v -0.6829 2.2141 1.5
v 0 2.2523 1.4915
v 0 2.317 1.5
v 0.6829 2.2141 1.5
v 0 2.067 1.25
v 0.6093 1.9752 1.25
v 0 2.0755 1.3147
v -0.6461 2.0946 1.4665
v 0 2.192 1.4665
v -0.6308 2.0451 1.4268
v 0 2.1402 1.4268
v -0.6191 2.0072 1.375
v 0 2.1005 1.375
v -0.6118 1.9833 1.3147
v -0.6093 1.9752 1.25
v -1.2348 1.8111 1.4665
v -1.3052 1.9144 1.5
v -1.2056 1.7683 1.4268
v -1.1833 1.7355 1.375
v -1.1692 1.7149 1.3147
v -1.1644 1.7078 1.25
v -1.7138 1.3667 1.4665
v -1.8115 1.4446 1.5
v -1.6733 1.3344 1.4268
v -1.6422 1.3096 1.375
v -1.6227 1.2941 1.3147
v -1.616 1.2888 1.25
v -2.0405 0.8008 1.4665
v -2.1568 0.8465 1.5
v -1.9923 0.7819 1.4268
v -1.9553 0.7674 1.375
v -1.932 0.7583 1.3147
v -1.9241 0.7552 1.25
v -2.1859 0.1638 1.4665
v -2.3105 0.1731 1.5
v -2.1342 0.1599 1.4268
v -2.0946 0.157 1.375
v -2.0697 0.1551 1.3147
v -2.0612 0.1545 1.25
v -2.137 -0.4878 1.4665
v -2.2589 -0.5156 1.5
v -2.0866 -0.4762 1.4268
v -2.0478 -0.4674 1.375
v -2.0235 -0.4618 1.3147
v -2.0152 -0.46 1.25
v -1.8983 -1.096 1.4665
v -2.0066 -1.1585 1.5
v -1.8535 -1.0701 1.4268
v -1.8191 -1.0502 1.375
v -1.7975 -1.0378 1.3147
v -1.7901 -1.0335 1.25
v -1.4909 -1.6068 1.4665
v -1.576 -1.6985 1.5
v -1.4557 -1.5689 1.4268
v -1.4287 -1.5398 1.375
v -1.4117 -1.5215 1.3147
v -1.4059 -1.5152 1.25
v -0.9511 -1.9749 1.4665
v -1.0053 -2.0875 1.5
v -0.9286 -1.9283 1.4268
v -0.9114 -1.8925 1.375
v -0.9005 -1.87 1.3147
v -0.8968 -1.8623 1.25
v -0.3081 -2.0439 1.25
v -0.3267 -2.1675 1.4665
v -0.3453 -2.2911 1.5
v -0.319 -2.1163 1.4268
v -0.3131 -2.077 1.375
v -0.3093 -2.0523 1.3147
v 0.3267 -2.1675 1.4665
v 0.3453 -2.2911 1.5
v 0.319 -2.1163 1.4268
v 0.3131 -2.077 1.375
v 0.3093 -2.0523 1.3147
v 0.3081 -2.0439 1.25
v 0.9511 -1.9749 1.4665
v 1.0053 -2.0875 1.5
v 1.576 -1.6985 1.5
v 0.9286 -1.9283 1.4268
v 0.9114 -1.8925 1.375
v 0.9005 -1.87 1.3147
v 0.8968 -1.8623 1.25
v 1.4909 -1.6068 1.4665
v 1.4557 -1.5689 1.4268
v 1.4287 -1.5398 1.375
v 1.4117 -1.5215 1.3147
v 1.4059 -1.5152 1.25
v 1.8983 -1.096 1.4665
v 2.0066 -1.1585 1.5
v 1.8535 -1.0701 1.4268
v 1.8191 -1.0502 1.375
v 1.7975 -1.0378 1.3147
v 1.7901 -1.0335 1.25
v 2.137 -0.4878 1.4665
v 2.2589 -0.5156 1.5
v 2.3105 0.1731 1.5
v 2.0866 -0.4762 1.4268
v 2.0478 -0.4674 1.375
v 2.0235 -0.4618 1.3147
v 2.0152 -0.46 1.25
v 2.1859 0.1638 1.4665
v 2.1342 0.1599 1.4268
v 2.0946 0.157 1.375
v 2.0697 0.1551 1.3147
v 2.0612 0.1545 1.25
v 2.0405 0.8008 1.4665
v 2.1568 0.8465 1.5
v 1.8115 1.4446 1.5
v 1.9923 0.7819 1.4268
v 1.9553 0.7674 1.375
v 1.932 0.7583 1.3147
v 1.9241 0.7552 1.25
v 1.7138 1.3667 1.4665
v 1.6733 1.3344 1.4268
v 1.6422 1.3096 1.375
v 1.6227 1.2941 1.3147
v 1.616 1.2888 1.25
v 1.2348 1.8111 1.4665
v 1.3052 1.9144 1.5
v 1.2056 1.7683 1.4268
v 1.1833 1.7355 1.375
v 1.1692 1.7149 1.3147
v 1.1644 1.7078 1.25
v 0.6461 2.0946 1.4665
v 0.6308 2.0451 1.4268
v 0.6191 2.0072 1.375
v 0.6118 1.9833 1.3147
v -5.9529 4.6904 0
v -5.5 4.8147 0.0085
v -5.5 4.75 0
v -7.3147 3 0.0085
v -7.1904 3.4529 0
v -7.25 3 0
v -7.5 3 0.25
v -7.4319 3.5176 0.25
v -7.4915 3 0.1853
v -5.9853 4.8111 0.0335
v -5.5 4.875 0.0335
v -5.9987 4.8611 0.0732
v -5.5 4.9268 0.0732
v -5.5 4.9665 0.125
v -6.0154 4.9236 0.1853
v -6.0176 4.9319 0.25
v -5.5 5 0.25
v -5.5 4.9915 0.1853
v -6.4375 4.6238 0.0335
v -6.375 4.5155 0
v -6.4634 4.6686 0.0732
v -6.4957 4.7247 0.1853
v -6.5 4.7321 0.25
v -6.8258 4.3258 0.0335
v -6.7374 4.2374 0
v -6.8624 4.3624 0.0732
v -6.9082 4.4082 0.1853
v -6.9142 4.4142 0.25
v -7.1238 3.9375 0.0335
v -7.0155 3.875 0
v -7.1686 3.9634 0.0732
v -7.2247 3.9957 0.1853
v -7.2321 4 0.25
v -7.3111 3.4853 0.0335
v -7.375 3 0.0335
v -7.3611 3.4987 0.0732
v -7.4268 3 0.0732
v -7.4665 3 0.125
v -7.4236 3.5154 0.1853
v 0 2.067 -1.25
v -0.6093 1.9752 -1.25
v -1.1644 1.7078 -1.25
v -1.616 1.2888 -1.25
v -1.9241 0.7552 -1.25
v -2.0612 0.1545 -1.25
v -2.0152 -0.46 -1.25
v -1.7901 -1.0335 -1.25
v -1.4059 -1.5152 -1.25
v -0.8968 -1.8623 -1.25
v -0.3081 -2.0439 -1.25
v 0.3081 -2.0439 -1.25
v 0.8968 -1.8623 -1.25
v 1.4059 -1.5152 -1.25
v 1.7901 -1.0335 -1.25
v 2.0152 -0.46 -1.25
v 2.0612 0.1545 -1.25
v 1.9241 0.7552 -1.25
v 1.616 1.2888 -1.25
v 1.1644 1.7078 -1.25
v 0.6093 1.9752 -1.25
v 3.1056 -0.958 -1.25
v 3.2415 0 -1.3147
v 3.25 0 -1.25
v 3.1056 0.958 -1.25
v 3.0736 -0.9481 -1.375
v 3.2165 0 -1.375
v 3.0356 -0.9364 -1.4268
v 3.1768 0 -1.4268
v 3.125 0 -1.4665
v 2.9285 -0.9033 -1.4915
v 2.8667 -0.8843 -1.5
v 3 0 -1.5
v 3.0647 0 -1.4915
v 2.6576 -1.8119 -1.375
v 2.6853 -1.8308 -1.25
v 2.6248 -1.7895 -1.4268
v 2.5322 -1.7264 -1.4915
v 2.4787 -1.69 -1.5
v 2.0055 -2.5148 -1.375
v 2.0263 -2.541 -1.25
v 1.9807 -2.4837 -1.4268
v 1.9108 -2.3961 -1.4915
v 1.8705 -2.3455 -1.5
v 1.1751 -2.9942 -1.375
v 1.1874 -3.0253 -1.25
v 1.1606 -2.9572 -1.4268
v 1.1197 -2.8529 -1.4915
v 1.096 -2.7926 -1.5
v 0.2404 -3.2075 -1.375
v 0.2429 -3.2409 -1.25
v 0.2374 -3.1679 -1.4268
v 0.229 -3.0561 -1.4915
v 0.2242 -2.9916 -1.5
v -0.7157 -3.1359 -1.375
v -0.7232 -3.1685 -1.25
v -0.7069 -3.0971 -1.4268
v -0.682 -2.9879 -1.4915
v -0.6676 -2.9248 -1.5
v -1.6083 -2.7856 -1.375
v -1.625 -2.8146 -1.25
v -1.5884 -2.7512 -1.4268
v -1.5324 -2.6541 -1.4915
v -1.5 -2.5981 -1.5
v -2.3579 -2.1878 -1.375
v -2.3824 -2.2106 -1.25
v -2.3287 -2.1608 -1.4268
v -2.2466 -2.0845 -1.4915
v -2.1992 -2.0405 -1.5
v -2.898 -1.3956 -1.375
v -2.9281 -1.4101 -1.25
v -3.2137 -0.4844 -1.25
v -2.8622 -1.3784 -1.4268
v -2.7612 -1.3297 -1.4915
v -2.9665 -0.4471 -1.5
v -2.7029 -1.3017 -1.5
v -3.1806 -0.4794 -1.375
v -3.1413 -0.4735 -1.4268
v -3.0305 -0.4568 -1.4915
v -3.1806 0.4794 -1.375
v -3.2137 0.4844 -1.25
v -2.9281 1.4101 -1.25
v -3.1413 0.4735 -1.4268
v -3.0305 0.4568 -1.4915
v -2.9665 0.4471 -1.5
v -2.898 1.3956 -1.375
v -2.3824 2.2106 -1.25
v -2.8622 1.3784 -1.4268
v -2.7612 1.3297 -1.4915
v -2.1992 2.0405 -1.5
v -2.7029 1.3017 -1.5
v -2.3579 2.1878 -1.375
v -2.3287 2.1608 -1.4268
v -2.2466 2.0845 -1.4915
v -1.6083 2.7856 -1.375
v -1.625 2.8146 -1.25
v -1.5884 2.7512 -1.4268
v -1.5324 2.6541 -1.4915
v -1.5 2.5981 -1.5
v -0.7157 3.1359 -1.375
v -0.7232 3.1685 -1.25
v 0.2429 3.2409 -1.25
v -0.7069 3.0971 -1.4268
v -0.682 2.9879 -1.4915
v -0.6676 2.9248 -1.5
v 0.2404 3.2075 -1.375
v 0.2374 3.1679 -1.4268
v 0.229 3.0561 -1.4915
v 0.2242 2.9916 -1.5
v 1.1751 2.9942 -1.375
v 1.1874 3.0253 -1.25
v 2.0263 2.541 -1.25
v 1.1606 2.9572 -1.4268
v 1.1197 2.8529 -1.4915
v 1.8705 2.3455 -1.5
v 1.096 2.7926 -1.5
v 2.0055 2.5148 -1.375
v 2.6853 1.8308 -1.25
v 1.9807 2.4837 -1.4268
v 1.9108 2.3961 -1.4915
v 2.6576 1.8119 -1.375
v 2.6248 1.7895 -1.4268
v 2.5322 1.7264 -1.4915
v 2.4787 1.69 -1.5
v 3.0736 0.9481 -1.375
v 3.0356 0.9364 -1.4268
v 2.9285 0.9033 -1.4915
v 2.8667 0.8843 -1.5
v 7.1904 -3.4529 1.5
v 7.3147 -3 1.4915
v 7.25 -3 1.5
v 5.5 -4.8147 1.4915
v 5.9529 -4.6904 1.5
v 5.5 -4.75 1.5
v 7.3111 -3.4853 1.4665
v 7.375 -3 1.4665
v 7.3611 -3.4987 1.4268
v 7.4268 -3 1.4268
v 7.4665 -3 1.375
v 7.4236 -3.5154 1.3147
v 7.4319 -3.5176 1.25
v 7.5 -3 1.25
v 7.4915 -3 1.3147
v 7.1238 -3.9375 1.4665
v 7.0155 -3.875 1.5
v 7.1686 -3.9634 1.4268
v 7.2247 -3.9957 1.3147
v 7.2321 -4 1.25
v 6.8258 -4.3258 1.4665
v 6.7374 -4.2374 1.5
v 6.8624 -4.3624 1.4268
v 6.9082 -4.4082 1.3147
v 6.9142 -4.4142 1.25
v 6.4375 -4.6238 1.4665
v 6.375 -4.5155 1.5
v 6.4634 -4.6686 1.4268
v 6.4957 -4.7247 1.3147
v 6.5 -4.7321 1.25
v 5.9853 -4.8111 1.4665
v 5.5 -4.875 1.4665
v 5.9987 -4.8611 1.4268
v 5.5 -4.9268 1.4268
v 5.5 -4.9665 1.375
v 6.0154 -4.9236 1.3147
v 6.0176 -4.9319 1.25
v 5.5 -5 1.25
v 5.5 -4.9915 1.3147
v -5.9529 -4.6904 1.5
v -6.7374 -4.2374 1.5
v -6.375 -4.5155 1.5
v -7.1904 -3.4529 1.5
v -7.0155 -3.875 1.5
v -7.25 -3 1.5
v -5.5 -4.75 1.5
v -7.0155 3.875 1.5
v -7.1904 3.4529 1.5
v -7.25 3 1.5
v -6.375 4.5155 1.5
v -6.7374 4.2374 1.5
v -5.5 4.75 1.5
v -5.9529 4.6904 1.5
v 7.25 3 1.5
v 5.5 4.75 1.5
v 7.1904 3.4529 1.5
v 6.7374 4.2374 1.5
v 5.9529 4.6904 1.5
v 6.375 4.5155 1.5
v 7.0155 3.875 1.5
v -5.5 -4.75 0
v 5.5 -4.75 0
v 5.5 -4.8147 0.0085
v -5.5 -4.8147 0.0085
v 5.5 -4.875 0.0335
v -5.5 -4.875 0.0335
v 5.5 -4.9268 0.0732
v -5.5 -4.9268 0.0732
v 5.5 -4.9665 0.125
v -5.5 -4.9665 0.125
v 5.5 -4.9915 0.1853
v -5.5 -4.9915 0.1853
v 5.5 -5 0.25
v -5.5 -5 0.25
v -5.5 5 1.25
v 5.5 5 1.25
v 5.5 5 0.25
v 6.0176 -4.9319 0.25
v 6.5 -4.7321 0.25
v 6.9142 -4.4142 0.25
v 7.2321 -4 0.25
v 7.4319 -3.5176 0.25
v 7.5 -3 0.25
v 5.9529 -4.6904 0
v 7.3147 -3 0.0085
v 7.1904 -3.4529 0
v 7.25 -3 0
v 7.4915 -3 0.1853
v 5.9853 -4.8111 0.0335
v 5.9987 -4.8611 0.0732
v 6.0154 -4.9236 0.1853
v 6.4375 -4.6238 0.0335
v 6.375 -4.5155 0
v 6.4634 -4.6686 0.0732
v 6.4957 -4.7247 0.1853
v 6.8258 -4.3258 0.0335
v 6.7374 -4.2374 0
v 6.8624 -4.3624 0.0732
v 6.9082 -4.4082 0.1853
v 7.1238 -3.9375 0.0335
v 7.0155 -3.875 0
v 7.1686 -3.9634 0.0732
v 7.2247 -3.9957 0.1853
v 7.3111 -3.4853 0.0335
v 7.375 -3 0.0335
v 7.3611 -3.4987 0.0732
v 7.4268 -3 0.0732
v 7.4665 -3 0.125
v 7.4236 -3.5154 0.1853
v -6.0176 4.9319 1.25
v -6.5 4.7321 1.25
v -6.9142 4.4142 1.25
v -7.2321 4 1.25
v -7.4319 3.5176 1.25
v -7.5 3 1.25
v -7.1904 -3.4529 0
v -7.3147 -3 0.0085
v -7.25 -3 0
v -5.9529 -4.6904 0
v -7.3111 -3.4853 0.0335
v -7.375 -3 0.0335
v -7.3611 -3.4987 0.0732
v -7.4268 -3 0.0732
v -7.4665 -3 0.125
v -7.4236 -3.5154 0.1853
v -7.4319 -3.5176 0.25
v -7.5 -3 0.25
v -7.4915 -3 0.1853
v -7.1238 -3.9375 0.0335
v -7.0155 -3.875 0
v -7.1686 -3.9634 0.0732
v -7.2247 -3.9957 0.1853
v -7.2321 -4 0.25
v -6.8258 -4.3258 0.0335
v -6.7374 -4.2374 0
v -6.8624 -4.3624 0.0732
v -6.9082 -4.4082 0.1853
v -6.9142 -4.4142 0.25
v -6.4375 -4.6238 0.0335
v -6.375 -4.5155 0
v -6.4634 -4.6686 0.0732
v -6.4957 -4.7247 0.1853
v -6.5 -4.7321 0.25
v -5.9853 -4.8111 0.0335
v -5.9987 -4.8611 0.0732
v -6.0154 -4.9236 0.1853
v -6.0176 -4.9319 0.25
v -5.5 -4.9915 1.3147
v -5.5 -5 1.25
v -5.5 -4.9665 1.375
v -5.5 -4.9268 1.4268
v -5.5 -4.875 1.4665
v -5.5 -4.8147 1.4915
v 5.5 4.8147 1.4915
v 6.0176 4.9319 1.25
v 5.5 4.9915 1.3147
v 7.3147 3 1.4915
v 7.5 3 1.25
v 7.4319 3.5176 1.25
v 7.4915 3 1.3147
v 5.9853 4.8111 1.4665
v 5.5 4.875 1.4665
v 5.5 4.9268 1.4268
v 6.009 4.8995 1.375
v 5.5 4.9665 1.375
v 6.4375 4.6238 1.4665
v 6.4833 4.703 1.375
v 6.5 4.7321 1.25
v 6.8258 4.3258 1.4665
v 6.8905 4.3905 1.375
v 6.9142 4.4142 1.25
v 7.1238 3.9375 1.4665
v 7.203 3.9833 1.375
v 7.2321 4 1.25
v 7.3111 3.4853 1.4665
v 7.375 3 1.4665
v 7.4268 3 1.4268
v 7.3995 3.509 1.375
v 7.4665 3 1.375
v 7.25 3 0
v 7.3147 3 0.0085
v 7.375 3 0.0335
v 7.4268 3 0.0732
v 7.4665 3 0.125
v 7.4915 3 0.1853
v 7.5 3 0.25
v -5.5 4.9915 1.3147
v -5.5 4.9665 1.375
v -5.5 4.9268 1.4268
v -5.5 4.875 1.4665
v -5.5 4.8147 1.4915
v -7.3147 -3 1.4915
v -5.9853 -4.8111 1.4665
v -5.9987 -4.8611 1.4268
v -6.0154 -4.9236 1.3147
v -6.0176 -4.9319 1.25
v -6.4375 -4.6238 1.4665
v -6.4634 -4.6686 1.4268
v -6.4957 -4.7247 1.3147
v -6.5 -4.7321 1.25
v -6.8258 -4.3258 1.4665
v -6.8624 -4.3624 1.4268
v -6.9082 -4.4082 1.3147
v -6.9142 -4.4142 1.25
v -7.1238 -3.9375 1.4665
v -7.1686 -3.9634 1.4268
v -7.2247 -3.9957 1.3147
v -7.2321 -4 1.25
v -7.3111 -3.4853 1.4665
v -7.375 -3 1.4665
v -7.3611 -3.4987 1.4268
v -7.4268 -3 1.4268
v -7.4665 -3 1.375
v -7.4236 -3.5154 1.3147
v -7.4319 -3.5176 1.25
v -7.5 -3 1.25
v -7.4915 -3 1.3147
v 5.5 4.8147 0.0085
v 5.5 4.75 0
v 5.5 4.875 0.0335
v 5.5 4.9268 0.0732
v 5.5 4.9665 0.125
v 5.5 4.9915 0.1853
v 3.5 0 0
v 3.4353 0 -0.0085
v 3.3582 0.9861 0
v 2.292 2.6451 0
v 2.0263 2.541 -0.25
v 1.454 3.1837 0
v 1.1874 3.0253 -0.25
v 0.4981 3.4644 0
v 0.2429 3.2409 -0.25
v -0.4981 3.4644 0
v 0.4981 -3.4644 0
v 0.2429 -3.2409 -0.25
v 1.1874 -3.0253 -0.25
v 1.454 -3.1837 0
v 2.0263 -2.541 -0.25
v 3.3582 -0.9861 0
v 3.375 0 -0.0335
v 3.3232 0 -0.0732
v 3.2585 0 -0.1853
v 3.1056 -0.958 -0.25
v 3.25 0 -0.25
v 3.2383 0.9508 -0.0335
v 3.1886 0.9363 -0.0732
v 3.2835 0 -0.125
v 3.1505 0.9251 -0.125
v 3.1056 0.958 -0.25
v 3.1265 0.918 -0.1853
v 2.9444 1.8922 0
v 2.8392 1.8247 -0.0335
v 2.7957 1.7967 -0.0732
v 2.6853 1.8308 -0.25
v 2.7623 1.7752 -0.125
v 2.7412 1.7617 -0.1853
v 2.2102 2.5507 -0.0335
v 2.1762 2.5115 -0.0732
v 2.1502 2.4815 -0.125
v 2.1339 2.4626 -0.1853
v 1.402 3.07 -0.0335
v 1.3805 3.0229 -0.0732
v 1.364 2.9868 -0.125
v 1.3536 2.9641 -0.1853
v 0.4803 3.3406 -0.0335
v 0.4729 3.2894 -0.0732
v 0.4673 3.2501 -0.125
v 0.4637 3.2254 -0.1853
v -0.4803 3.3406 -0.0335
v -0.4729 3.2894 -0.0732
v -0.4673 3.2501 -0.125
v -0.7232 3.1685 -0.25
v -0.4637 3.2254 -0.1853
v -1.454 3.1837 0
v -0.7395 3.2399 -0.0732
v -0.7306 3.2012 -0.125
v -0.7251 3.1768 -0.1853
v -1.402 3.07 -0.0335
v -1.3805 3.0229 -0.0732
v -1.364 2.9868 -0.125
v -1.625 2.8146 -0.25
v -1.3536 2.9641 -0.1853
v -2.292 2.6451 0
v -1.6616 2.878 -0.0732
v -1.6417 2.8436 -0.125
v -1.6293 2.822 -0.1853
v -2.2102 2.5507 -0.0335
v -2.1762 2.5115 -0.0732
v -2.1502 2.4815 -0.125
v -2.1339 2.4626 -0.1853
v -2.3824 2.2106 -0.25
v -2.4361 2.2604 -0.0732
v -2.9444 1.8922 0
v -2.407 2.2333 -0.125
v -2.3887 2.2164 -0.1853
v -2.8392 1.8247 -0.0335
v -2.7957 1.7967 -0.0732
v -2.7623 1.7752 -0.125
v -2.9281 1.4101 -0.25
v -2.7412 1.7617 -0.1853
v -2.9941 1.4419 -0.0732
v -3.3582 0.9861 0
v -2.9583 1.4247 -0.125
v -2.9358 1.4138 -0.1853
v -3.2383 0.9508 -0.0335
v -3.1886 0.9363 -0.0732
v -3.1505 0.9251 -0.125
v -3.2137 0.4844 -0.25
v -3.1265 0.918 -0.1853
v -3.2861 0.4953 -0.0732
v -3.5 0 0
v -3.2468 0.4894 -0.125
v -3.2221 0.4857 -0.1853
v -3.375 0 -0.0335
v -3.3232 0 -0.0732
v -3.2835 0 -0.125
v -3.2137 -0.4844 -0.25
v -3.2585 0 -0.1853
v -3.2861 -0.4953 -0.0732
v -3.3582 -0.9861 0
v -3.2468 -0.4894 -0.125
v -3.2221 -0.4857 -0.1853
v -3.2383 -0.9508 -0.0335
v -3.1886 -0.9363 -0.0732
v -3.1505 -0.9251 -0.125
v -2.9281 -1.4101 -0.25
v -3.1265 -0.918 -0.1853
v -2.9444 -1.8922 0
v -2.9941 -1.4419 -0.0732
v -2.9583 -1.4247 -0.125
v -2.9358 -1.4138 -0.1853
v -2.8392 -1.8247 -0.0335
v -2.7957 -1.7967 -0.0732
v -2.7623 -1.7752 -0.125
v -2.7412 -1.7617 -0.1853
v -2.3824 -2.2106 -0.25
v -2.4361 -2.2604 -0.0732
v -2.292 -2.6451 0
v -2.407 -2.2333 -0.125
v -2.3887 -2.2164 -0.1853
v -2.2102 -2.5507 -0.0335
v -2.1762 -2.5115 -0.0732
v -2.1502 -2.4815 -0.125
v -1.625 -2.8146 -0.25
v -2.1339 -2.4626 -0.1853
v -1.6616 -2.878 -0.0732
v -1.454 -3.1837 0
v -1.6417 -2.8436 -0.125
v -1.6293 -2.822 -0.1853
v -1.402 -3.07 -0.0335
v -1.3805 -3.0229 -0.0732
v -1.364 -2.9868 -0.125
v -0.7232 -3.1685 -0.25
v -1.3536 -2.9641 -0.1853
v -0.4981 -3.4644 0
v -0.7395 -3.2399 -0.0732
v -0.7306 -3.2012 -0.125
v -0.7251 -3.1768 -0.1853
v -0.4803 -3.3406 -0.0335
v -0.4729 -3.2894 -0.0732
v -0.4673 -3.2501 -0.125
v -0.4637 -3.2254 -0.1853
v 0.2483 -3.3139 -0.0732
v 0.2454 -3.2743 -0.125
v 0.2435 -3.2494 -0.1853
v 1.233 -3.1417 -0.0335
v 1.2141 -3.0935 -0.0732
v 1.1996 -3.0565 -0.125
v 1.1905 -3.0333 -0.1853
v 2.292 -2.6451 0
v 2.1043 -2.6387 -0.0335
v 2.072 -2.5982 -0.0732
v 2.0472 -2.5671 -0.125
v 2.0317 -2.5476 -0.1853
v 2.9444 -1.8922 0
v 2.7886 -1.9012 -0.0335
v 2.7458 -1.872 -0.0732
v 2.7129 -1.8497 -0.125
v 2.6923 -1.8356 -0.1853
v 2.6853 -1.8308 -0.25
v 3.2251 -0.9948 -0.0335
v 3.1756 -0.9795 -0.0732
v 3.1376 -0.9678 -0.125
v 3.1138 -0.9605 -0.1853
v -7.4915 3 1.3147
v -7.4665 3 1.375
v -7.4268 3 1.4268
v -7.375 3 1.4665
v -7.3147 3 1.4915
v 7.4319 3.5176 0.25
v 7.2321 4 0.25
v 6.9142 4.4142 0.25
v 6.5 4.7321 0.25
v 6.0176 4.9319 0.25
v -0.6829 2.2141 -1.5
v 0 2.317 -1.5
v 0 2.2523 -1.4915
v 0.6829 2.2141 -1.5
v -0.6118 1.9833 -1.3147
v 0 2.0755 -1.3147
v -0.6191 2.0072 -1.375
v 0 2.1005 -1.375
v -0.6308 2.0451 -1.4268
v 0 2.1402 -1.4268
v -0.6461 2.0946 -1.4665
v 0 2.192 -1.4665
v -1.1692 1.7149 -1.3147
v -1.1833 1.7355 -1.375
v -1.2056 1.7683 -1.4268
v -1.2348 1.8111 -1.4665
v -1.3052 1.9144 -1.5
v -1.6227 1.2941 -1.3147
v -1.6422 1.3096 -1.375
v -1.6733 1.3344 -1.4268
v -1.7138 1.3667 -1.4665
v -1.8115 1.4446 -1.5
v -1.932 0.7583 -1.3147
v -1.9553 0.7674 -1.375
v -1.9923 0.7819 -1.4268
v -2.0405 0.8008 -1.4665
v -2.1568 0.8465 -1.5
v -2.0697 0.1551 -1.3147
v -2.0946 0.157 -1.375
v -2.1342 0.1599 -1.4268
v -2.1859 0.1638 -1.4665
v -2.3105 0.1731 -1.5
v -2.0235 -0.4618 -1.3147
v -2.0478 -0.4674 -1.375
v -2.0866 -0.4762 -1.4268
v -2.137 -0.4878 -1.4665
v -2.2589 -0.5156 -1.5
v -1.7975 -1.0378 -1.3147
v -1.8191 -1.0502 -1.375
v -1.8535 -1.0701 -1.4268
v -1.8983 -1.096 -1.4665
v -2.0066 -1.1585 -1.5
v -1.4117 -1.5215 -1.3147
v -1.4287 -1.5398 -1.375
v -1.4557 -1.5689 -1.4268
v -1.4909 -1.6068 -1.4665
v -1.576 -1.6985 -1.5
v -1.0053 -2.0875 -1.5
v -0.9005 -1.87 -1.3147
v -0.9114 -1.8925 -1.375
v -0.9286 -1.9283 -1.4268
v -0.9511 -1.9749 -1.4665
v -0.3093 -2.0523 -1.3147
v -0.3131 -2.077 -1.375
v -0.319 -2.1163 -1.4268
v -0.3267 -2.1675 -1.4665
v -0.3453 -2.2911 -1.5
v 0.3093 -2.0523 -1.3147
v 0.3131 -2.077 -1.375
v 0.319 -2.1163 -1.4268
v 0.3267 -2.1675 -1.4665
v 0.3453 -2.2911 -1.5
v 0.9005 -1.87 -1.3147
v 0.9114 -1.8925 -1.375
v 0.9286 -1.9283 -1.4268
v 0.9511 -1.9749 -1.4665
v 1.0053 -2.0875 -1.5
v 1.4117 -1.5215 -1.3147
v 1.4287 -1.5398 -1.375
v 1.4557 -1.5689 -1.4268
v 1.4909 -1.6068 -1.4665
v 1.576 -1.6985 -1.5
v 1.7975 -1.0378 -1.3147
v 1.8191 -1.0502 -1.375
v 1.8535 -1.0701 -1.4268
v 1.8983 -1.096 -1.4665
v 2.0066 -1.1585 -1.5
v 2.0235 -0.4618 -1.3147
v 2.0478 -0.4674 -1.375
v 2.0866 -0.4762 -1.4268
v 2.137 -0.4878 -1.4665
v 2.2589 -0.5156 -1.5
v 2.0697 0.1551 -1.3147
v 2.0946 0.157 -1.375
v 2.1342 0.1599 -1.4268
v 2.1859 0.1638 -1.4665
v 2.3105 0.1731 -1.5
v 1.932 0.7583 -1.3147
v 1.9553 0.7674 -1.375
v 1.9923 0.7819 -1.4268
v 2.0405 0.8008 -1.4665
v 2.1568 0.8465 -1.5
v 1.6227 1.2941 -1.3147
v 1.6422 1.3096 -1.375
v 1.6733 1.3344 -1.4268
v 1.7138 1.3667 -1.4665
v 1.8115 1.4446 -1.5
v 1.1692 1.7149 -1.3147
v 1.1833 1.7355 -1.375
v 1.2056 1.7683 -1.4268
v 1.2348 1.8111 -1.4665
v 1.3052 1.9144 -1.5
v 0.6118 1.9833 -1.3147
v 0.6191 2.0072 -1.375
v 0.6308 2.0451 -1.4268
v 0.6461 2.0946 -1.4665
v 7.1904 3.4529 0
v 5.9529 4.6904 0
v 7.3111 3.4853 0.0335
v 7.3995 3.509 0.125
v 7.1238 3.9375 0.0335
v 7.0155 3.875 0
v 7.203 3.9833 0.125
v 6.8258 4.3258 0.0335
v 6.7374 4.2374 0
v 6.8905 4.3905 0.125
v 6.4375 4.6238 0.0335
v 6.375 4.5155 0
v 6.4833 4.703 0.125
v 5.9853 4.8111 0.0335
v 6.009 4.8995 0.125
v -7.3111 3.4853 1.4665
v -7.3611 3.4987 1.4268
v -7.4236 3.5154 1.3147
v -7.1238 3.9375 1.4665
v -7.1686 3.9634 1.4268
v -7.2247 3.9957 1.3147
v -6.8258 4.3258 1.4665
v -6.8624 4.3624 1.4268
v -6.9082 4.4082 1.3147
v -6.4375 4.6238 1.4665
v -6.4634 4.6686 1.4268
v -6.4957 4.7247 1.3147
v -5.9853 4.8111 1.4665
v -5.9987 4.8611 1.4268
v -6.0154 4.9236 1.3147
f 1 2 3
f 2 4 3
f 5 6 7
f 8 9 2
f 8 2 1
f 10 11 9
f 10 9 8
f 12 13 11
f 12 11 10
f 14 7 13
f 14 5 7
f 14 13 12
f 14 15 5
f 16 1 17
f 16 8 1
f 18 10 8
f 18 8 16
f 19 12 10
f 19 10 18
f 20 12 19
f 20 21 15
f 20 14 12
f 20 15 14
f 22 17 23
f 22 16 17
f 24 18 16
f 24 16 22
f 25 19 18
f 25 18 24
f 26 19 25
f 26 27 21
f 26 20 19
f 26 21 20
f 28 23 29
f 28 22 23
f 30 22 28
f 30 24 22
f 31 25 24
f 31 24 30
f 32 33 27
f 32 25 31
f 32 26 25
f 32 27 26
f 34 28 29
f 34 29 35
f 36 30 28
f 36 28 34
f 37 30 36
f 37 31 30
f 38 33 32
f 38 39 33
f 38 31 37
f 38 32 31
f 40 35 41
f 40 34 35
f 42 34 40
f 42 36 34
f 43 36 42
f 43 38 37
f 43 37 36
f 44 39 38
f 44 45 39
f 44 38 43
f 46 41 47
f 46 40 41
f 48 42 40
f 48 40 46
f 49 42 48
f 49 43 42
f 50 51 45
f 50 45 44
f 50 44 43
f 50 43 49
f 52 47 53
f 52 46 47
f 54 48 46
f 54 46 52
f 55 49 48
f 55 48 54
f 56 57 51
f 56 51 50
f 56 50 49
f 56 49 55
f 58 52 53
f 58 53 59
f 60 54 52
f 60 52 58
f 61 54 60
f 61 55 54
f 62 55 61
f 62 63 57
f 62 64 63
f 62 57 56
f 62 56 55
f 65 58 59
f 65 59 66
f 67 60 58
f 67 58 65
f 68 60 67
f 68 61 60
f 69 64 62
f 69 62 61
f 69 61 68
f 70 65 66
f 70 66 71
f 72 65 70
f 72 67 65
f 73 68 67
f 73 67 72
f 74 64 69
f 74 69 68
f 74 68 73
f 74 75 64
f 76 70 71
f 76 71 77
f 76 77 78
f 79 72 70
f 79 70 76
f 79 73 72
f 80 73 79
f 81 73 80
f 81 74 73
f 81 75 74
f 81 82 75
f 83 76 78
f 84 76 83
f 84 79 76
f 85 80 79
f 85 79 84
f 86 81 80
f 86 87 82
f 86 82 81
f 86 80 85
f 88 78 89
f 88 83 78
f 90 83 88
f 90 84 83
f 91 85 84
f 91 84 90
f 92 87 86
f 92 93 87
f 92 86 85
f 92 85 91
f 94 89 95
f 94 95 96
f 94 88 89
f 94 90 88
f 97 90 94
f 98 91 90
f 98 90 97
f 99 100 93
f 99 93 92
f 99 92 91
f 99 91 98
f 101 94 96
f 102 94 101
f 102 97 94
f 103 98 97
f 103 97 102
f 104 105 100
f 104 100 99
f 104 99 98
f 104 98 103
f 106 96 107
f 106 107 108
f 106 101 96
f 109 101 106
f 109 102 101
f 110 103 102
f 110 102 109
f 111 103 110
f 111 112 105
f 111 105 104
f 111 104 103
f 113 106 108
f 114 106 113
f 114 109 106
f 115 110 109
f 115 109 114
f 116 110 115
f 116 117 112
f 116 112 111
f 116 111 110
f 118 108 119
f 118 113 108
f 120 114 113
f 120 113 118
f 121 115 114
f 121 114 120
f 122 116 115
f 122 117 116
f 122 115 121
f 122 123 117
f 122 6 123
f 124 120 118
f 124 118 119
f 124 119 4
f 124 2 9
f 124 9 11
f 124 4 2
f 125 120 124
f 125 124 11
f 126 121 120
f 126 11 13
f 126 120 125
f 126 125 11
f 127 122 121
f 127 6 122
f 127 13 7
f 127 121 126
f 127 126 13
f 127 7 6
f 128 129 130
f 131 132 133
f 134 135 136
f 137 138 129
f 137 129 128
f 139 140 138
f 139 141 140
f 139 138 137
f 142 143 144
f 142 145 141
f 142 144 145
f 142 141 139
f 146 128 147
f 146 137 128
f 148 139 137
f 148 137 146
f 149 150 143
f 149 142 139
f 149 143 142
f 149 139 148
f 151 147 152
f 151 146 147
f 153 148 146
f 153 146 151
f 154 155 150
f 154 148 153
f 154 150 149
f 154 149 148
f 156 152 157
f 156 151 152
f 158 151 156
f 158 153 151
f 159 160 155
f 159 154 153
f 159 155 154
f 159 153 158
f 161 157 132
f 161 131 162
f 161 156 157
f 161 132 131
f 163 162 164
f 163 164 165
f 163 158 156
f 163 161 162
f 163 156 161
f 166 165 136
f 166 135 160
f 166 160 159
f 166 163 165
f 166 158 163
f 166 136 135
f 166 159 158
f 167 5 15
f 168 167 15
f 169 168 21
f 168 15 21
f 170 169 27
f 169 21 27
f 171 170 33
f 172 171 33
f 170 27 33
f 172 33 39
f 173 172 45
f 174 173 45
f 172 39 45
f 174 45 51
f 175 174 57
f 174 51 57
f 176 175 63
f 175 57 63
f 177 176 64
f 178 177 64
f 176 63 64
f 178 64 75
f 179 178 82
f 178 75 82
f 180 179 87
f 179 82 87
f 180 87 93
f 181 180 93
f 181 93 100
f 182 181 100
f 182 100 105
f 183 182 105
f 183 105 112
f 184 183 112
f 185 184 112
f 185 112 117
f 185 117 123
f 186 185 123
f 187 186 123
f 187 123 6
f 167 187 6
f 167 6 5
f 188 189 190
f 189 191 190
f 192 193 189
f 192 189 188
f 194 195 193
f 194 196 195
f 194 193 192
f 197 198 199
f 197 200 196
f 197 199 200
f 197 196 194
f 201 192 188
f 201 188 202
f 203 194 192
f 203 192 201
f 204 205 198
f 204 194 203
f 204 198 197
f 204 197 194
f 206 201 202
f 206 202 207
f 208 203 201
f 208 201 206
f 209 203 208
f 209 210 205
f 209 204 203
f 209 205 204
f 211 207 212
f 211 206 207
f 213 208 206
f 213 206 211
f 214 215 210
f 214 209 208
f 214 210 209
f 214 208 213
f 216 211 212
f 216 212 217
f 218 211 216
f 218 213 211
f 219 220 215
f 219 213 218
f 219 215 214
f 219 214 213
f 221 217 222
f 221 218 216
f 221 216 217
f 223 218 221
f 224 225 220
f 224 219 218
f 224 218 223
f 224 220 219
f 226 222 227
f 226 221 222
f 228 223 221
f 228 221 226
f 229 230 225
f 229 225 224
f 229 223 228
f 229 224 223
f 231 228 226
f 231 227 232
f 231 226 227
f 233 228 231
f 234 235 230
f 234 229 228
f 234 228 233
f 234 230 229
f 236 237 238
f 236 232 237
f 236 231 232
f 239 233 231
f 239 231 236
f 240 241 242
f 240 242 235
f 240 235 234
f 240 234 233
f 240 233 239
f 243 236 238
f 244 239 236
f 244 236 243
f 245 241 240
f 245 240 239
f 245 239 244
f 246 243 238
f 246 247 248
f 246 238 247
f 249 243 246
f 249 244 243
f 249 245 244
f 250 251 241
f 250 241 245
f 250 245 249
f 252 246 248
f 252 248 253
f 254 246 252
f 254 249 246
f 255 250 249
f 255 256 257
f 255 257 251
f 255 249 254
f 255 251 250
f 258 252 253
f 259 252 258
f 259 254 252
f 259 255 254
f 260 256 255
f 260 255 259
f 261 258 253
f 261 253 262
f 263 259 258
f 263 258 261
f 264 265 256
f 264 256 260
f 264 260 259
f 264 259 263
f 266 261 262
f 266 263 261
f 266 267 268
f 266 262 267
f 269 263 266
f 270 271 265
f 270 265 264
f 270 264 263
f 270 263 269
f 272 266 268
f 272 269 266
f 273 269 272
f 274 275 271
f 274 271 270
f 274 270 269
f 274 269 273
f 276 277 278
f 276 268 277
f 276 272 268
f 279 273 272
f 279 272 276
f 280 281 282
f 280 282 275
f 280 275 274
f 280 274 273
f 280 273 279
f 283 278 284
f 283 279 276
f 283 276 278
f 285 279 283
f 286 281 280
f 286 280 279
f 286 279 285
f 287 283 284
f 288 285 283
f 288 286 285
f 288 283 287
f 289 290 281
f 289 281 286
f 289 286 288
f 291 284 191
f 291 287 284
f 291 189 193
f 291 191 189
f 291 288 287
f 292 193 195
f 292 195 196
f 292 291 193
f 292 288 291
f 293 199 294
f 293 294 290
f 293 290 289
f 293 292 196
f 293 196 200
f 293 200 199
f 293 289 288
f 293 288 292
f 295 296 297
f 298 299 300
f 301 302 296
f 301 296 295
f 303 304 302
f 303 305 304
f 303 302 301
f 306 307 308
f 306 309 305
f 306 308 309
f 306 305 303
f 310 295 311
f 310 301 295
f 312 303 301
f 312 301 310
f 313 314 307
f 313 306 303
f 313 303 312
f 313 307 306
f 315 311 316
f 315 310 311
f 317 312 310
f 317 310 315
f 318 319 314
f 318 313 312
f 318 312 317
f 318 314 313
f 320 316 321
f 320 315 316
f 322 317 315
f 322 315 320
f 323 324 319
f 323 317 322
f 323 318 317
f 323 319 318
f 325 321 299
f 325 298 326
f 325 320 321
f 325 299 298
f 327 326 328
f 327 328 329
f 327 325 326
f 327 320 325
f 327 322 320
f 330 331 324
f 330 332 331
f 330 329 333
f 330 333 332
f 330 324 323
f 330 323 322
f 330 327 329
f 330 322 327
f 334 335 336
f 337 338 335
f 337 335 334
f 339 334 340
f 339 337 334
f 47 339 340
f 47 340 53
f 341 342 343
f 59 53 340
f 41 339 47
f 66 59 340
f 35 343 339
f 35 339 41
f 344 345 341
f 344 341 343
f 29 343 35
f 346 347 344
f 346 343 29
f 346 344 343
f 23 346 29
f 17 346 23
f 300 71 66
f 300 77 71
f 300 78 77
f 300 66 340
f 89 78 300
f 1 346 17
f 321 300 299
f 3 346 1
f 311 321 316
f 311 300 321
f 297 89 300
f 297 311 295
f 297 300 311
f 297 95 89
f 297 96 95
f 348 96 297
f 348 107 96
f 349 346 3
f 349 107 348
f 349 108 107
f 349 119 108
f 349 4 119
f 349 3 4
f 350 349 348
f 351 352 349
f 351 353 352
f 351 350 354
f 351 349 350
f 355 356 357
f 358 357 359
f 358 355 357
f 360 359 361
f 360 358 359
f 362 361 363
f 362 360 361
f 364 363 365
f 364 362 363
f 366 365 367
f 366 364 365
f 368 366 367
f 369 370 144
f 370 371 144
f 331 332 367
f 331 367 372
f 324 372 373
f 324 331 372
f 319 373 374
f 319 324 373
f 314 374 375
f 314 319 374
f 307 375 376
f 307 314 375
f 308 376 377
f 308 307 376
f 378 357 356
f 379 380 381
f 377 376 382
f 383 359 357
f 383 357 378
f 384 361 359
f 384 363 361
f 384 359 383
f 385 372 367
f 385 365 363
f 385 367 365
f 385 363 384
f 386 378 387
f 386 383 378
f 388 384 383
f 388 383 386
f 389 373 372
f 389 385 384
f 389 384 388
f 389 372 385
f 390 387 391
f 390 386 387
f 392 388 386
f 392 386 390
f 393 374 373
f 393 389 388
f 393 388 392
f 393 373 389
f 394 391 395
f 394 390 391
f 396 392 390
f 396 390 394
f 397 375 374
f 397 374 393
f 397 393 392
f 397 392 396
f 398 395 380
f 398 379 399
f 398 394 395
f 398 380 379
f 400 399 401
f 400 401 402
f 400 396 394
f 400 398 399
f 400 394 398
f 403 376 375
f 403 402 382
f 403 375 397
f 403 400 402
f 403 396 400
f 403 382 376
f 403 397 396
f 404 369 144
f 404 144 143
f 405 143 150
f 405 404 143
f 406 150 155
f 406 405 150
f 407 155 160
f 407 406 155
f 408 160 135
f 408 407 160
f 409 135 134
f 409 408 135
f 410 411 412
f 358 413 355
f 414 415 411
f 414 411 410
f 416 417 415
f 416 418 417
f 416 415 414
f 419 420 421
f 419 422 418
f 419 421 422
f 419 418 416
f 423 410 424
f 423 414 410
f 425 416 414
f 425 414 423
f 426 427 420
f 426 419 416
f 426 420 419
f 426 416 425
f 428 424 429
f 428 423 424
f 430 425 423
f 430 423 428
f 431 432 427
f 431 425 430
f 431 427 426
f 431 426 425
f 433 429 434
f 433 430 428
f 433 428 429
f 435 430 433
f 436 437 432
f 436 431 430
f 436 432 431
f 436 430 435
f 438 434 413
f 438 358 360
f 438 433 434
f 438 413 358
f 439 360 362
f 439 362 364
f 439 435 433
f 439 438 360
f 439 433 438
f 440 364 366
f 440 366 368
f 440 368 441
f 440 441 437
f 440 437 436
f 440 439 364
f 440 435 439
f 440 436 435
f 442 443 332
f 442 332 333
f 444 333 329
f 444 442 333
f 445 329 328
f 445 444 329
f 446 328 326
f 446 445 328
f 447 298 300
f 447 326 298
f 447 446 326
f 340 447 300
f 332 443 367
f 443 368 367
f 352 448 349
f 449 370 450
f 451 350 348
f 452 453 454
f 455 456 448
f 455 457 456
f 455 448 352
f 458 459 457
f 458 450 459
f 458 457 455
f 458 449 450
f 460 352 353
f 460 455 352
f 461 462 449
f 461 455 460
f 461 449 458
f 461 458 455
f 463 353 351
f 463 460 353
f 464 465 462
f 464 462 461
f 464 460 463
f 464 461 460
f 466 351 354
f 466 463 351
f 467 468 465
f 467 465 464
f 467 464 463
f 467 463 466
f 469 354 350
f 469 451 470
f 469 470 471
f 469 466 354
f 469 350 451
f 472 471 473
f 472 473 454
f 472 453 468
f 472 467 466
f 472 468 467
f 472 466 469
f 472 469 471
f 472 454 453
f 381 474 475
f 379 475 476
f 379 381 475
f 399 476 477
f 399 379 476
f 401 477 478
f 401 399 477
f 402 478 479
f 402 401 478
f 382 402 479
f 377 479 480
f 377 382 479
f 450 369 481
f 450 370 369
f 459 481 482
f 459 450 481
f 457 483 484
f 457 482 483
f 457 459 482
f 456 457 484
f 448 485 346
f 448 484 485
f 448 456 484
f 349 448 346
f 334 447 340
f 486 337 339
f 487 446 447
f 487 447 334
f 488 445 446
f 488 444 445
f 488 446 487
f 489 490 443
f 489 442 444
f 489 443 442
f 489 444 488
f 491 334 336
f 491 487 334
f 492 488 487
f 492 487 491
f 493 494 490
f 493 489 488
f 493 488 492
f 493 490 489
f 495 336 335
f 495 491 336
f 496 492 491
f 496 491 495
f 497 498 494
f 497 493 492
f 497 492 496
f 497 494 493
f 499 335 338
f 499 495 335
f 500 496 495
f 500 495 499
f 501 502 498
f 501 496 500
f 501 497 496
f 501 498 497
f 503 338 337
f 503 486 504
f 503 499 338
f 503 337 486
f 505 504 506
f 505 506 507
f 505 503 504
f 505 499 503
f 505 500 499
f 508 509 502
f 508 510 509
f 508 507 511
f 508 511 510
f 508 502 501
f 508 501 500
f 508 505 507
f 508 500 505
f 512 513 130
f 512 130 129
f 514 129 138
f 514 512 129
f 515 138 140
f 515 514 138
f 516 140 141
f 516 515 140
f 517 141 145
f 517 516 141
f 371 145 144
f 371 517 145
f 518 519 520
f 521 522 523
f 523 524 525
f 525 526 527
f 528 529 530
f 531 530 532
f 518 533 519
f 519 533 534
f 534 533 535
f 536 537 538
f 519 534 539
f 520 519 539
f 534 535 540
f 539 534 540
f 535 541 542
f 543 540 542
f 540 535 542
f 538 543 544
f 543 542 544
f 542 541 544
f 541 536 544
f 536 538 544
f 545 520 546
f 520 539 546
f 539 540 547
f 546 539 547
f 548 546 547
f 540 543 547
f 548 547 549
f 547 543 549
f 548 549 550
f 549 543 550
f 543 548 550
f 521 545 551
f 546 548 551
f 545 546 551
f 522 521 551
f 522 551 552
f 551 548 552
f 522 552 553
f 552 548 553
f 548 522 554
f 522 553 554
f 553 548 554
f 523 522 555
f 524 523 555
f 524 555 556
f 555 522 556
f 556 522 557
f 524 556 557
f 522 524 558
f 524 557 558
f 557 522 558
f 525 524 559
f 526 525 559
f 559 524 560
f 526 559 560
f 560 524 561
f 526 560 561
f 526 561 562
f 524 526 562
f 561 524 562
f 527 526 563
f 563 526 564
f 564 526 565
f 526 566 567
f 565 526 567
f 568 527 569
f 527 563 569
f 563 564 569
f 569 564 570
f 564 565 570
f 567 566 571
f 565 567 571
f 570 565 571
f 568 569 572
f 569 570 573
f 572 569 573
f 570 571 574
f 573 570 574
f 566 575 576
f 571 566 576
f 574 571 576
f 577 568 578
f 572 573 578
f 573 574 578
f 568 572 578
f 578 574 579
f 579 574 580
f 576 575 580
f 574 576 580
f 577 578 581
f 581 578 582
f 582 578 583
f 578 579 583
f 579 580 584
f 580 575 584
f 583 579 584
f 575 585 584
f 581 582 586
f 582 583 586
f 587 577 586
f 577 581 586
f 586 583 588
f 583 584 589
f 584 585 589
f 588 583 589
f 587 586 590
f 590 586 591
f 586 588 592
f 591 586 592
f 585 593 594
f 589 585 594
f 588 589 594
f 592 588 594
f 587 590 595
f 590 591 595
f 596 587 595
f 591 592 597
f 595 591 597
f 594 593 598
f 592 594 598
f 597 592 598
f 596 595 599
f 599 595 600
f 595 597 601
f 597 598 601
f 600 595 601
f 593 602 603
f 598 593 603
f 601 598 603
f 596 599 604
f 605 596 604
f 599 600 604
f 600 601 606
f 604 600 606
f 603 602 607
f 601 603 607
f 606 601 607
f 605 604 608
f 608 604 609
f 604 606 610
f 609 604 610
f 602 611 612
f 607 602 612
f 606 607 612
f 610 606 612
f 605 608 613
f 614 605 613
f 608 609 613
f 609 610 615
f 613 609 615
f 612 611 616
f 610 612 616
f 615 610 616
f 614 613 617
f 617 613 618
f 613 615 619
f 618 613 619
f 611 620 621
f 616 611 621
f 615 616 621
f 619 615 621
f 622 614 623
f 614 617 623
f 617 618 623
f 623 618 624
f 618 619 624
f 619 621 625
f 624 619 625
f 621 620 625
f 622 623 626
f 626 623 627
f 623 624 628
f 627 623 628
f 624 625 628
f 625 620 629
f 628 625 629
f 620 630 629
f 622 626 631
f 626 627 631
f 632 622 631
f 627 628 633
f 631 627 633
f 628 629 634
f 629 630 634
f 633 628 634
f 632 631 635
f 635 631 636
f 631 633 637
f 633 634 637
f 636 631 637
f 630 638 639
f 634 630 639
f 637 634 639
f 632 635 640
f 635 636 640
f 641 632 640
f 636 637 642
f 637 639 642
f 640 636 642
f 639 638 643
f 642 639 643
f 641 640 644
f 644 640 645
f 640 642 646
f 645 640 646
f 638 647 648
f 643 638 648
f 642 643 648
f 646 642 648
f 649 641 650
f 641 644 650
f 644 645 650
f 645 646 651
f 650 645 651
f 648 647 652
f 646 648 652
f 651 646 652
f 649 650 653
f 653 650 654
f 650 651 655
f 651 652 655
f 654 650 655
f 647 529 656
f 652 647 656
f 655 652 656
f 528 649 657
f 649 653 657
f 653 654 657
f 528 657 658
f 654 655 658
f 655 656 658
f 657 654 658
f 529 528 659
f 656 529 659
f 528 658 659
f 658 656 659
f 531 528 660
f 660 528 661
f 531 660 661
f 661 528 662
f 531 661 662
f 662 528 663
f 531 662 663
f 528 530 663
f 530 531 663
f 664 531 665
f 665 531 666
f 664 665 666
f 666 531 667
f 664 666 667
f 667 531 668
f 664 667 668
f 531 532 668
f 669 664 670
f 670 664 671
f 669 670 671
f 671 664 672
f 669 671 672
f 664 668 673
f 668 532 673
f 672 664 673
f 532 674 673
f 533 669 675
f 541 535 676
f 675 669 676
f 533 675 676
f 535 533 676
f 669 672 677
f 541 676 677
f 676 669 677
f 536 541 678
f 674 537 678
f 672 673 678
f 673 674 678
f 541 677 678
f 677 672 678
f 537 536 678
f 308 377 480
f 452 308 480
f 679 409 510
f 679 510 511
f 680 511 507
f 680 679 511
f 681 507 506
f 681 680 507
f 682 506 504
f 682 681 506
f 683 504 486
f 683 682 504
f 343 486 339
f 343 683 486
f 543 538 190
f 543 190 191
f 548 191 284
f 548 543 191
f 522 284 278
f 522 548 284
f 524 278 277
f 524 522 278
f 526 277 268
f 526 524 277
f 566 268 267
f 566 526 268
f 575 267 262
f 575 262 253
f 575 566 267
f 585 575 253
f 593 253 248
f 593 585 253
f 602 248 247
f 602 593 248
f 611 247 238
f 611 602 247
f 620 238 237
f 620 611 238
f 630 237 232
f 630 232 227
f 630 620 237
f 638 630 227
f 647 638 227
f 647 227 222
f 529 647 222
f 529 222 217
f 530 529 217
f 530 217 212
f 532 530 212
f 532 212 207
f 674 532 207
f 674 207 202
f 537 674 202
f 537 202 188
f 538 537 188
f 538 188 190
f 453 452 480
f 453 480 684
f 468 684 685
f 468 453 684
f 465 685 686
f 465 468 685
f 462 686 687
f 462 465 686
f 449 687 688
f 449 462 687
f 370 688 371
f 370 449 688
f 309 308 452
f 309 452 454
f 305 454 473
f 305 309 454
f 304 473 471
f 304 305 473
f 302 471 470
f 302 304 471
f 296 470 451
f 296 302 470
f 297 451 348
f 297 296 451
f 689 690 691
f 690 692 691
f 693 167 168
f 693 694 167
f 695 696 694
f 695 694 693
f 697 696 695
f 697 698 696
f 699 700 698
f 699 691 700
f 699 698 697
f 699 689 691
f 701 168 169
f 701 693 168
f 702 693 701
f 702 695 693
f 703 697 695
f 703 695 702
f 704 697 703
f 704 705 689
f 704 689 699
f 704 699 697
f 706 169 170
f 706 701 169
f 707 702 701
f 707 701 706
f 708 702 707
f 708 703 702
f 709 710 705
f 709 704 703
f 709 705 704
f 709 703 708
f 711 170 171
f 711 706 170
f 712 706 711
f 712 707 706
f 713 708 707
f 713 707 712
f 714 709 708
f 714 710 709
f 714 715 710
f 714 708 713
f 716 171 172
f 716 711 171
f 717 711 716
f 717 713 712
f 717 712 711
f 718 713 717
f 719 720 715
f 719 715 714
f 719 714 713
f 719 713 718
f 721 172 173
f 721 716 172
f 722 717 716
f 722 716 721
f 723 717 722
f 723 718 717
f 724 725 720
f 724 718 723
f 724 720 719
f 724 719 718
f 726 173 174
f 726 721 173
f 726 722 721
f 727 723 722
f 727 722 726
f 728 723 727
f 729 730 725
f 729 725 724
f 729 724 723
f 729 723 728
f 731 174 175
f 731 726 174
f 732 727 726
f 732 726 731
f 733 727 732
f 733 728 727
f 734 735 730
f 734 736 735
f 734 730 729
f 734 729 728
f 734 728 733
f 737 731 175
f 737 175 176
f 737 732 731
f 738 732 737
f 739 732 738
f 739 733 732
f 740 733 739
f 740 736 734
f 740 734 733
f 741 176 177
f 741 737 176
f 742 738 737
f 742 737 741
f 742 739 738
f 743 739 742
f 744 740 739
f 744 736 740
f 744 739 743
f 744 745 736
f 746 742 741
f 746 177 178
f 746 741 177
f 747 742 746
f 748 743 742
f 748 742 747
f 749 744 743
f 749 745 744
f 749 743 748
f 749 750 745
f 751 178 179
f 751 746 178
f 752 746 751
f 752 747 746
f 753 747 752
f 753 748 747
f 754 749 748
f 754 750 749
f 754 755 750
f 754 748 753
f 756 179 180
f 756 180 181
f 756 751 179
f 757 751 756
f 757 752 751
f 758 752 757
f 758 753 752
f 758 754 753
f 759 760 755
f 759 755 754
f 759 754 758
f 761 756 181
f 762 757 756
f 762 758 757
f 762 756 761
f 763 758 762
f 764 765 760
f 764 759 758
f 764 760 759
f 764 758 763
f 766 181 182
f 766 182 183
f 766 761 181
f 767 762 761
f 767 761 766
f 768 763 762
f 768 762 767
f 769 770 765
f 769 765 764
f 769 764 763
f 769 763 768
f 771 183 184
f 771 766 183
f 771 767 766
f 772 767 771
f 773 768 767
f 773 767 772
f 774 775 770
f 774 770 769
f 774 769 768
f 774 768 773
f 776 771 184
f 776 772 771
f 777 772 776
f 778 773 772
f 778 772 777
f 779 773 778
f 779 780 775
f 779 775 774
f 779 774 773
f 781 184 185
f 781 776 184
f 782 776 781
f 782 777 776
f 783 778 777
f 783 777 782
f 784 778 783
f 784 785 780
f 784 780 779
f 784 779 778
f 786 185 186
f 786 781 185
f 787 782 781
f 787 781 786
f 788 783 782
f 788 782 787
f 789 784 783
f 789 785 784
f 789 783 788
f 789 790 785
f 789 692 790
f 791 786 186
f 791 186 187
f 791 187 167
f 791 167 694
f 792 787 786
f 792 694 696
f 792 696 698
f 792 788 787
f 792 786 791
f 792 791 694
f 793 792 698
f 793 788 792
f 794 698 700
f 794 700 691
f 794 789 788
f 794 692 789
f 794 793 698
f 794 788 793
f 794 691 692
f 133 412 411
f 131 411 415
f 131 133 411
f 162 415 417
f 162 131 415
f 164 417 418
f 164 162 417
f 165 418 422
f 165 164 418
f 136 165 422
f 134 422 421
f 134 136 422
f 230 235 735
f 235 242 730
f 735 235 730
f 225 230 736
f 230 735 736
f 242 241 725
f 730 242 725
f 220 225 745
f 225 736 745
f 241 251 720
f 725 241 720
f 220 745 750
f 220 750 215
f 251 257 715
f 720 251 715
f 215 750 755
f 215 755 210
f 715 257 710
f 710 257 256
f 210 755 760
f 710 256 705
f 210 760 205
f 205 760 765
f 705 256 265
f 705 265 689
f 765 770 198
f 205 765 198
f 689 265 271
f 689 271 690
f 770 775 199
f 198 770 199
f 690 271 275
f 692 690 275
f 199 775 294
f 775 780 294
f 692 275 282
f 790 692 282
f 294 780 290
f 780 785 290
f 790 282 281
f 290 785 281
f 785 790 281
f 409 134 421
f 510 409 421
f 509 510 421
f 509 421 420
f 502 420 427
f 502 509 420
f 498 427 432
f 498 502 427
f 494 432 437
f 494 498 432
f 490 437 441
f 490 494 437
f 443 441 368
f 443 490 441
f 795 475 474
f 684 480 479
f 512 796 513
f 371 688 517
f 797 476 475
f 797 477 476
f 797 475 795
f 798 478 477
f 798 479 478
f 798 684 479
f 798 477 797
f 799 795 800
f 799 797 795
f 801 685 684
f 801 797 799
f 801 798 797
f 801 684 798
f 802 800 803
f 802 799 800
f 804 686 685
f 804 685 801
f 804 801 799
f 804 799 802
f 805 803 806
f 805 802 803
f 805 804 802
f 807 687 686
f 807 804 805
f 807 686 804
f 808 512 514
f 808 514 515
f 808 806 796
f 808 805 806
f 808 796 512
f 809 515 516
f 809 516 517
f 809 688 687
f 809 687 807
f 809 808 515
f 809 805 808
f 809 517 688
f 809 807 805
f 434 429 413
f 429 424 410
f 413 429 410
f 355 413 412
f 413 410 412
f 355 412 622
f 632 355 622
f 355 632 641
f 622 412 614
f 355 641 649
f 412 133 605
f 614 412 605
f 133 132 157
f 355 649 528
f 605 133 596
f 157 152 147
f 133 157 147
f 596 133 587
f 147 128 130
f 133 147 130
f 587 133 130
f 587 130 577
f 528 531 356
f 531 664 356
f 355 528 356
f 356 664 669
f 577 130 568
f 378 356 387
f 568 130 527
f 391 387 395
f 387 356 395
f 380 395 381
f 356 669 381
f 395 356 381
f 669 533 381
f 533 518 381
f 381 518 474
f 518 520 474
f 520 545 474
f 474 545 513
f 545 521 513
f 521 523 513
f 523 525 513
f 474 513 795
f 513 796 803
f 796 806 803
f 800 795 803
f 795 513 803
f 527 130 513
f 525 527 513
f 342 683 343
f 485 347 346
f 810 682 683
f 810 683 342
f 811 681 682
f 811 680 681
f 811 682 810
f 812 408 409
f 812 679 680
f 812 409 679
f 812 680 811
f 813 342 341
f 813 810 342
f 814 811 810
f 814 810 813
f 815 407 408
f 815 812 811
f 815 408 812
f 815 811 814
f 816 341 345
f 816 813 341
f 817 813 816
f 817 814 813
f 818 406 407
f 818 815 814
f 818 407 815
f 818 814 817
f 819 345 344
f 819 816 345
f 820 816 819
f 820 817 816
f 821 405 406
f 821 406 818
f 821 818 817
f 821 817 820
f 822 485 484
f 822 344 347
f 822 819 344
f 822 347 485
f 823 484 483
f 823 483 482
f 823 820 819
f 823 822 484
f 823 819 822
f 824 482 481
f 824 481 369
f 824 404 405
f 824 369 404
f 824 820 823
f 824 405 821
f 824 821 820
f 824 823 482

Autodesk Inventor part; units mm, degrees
ref_plane "YZ Plane" through (0, 0, 0) normal (1, 0, 0) x (0, 1, 0)
ref_plane "XZ Plane" through (0, 0, 0) normal (0, 1, 0) x (-1, 0, 0)
ref_plane "XY Plane" through (0, 0, 0) normal (0, 0, 1) x (1, 0, 0)
sketch "Esquisse1" plane through (0, 0, 0) normal (0, 0, 1) x (1, 0, 0)
  line L0 (-7.5, -5) -> (7.5, -5)
  line L1 (7.5, -5) -> (7.5, 5)
  line L2 (7.5, 5) -> (-7.5, 5)
  line L3 (-7.5, 5) -> (-7.5, -5)
  line L4 (-7.5, -5) -> (7.5, 5) construction
  line L5 (7.5, -5) -> (-7.5, 5) construction
  point P0 (0, 0)
  dimension "d0" = 15
  dimension "d1" = 10
extrude "Extrusion1" add sketch "Esquisse1" along normal blind 1.5
fillet "Congé1" radius 2 4 edges at (7.5, 5, 0.75) (-7.5, 5, 0.75) (7.5, -5, 0.75) (-7.5, -5, 0.75)
sketch "Esquisse2" plane through (0, 0, 0) normal (0, 0, 1) x (1, 0, 0)
  circle A0 centre (0, 0) radius 3.25
  dimension "d5" = 6.5
extrude "Extrusion2" add sketch "Esquisse2" against normal blind 1.5
sketch "Esquisse3" plane through (0, 0, -1.5) normal (0, 0, -1) x (-1, 0, 0)
  point P0 (0, 0)
  point P1 (0, 0)
hole "Perçage1" at (0, 0, -1.5) direction (0, 0, 1) diameter 4.134 depth 14.2 tip angle 118 thread size "M5x0.8" class "6H" standard "ISO Metric profile"
fillet "Congé2" radius 0.25 20 edges at (6.9142, 4.4142, 0) (0, 5, 0) (-6.9142, 4.4142, 0) (-7.5, 0, 0) (-6.9142, -4.4142, 0) (0, -5, 0) (6.9142, -4.4142, 0) (7.5, 0, 0) (6.9142, 4.4142, 1.5) (0, 5, 1.5) (-6.9142, 4.4142, 1.5) (-7.5, 0, 1.5) (-6.9142, -4.4142, 1.5) (0, -5, 1.5) (6.9142, -4.4142, 1.5) (7.5, 0, 1.5) (-3.25, 0, 0) (-3.25, 0, -1.5) (0, -2.067, 1.5) (0, -2.067, -1.5)
properties part number "Noix M5" material "Aluminium"
